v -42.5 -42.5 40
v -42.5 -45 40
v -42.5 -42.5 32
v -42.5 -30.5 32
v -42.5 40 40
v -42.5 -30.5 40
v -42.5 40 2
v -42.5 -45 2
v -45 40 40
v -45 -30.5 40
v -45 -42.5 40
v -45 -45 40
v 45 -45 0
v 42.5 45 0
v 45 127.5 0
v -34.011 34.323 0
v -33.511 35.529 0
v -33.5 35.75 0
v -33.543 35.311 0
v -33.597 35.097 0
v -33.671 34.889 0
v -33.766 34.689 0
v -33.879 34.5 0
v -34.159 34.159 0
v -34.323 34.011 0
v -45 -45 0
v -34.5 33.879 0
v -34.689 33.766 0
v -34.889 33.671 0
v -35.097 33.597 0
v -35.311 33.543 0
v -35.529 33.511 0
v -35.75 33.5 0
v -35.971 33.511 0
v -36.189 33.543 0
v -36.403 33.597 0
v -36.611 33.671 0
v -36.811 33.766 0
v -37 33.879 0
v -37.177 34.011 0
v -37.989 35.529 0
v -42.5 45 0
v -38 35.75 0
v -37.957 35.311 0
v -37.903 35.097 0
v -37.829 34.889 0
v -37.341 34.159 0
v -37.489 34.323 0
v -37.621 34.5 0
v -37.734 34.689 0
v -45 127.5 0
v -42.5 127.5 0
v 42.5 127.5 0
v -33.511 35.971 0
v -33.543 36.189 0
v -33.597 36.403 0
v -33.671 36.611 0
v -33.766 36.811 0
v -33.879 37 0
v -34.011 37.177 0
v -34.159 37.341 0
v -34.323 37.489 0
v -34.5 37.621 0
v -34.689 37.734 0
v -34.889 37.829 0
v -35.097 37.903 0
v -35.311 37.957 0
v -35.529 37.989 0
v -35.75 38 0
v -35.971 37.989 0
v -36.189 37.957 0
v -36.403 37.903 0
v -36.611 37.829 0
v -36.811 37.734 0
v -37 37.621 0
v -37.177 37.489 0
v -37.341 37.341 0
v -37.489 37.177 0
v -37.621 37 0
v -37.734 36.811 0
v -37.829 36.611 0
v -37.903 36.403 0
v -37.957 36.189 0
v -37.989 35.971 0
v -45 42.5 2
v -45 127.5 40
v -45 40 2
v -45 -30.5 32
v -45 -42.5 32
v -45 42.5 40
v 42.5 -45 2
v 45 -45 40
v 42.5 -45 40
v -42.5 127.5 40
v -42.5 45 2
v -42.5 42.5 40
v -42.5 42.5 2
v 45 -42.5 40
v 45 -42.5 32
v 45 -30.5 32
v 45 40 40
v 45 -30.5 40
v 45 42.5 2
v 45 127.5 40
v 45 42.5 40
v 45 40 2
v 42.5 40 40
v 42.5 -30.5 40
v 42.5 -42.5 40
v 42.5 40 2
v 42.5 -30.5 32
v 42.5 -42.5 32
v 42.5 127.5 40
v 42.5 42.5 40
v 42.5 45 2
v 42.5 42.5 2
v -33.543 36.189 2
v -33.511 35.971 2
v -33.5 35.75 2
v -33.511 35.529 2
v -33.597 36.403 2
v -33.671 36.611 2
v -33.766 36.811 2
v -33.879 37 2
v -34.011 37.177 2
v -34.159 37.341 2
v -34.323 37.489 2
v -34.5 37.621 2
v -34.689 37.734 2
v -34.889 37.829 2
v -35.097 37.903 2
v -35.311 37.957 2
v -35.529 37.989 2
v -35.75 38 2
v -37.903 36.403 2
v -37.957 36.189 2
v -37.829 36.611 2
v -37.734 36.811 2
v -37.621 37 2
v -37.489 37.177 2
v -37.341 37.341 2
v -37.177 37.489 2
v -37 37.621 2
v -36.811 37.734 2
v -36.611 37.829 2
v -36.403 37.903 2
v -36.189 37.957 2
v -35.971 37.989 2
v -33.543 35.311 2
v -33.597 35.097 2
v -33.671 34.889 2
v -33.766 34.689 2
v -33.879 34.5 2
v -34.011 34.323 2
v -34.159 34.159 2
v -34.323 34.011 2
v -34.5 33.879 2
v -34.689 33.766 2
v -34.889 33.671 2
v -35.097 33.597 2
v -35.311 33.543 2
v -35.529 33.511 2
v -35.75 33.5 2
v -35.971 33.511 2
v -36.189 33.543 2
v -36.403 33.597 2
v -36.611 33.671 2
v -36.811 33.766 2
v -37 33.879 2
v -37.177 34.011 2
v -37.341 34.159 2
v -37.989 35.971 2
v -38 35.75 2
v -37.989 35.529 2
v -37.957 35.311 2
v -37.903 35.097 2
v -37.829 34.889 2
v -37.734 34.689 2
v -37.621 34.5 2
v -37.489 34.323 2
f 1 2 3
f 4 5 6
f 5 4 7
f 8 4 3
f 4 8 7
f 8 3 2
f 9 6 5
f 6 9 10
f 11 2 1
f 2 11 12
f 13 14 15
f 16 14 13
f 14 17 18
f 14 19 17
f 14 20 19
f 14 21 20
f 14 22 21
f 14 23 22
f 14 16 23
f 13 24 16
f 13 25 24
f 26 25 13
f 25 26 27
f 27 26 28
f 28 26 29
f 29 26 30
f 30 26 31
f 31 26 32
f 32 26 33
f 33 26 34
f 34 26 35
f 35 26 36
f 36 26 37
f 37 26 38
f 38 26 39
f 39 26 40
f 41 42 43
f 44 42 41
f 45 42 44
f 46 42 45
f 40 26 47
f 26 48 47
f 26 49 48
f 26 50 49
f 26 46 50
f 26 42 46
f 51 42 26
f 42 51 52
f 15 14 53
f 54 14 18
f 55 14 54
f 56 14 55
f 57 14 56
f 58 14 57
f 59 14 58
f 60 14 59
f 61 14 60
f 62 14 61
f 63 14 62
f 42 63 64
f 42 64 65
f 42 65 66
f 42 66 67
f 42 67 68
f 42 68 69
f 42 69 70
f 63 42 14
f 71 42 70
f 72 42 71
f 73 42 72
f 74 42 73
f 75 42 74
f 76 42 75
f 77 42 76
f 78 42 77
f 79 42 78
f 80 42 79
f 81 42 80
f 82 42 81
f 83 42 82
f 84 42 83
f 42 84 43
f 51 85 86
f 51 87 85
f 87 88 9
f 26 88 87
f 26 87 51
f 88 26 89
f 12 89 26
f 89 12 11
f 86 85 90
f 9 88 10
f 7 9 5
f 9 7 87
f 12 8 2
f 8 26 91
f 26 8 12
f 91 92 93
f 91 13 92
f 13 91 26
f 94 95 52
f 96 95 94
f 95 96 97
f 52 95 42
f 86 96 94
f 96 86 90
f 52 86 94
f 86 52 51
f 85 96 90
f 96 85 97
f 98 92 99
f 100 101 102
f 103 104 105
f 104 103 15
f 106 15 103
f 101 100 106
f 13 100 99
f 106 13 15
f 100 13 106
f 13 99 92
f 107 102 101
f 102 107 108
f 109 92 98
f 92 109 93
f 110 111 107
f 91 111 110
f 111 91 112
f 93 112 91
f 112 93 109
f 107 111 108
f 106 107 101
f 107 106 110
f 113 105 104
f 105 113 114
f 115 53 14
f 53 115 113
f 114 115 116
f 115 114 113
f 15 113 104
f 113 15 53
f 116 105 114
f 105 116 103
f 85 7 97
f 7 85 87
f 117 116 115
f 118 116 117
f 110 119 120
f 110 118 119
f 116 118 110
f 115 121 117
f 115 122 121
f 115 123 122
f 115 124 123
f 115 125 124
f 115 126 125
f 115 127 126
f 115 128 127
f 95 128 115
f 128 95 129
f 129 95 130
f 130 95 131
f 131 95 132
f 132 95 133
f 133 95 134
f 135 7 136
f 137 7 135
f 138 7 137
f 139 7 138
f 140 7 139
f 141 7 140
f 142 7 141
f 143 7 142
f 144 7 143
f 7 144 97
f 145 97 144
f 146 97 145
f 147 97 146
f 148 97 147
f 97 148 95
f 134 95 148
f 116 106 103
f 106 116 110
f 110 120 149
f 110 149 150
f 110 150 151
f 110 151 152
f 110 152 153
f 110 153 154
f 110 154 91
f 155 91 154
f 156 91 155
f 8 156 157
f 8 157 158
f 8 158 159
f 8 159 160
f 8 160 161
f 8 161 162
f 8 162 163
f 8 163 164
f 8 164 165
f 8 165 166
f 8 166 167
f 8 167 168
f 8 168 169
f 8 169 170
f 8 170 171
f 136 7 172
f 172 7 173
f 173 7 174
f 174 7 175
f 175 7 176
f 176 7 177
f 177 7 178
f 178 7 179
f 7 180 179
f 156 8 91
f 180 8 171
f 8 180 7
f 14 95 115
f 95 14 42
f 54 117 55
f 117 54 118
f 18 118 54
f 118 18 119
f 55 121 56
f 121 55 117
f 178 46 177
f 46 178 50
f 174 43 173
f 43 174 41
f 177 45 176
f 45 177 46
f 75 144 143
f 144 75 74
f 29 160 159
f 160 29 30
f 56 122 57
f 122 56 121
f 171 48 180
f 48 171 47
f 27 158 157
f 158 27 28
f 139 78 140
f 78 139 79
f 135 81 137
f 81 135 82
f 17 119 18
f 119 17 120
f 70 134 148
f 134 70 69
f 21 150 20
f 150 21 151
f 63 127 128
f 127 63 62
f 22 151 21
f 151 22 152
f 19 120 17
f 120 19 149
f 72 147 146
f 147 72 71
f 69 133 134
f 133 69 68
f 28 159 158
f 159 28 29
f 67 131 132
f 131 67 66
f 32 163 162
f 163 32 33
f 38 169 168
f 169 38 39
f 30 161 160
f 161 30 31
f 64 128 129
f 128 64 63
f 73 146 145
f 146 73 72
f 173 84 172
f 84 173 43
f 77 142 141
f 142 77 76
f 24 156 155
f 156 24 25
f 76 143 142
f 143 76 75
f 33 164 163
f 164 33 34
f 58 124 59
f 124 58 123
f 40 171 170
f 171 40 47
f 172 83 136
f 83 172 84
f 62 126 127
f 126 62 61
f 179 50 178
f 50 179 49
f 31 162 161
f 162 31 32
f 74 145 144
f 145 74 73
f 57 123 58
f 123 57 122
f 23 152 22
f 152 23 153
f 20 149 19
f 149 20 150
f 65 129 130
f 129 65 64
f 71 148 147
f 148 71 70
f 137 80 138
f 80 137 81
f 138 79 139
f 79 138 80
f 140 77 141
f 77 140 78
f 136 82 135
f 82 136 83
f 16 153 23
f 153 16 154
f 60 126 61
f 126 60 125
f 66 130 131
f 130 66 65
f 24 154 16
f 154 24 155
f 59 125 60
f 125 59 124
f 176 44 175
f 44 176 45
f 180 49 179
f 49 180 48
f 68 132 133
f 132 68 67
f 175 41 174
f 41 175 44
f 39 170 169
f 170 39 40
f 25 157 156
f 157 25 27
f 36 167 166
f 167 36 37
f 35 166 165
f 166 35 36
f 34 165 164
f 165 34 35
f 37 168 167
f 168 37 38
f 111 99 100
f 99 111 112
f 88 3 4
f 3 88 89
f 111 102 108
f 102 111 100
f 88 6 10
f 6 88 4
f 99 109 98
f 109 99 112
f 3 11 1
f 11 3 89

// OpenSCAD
// Magnetic stirrer housing for 80 mm PC case fan
// Print orientation: top plate on bed (z = 0), walls build upward (+Z)

// ---------- Dimensions ----------
plate_t      = 2;     // top plate thickness
wall_t       = 2.5;   // wall thickness
box_h        = 40;    // outer wall height (open top)
outer_x      = 90;    // outer size in X
outer_y      = 90;    // outer size in Y
hole_d       = 4.5;   // M4 screw hole diameter
hole_pitch   = 71.5;  // screw hole centre-to-centre spacing (square)
notch_w      = 12;    // cable notch width
notch_depth  = 8;     // cable notch depth from open edge
eps          = 0.5;   // cutter overshoot past faces

$fn = 64;

// ---------- Model ----------
difference() {
    union() {
        // Top plate
        translate([-outer_x/2, -outer_y/2, 0])
            cube([outer_x, outer_y, plate_t]);

        // Four walls rising from the top plate to the open top
        for (sx = [-1, 1], sy = [-1, 1])
            translate([sx > 0 ? outer_x/2 - wall_t : -outer_x/2,
                       sy > 0 ? outer_y/2 - wall_t : -outer_y/2,
                       0])
                cube([wall_t, outer_y - 2*wall_t, box_h]);
    }

    // Screw holes through the top plate
    for (i = [0 : 3]) {
        x = -hole_pitch/2 + i * hole_pitch;
        translate([x, -hole_pitch/2 + (i + 1) * hole_pitch, -eps])
            cylinder(d = hole_d, h = plate_t + 2*eps);
    }

    // Cable notch in one wall (z = 32 to 40, open edge at z = 40)
    translate([-outer_x/2, -outer_y/2 + wall_t, box_h - notch_depth])
        cube([outer_x, notch_w, notch_depth + eps]);
}
